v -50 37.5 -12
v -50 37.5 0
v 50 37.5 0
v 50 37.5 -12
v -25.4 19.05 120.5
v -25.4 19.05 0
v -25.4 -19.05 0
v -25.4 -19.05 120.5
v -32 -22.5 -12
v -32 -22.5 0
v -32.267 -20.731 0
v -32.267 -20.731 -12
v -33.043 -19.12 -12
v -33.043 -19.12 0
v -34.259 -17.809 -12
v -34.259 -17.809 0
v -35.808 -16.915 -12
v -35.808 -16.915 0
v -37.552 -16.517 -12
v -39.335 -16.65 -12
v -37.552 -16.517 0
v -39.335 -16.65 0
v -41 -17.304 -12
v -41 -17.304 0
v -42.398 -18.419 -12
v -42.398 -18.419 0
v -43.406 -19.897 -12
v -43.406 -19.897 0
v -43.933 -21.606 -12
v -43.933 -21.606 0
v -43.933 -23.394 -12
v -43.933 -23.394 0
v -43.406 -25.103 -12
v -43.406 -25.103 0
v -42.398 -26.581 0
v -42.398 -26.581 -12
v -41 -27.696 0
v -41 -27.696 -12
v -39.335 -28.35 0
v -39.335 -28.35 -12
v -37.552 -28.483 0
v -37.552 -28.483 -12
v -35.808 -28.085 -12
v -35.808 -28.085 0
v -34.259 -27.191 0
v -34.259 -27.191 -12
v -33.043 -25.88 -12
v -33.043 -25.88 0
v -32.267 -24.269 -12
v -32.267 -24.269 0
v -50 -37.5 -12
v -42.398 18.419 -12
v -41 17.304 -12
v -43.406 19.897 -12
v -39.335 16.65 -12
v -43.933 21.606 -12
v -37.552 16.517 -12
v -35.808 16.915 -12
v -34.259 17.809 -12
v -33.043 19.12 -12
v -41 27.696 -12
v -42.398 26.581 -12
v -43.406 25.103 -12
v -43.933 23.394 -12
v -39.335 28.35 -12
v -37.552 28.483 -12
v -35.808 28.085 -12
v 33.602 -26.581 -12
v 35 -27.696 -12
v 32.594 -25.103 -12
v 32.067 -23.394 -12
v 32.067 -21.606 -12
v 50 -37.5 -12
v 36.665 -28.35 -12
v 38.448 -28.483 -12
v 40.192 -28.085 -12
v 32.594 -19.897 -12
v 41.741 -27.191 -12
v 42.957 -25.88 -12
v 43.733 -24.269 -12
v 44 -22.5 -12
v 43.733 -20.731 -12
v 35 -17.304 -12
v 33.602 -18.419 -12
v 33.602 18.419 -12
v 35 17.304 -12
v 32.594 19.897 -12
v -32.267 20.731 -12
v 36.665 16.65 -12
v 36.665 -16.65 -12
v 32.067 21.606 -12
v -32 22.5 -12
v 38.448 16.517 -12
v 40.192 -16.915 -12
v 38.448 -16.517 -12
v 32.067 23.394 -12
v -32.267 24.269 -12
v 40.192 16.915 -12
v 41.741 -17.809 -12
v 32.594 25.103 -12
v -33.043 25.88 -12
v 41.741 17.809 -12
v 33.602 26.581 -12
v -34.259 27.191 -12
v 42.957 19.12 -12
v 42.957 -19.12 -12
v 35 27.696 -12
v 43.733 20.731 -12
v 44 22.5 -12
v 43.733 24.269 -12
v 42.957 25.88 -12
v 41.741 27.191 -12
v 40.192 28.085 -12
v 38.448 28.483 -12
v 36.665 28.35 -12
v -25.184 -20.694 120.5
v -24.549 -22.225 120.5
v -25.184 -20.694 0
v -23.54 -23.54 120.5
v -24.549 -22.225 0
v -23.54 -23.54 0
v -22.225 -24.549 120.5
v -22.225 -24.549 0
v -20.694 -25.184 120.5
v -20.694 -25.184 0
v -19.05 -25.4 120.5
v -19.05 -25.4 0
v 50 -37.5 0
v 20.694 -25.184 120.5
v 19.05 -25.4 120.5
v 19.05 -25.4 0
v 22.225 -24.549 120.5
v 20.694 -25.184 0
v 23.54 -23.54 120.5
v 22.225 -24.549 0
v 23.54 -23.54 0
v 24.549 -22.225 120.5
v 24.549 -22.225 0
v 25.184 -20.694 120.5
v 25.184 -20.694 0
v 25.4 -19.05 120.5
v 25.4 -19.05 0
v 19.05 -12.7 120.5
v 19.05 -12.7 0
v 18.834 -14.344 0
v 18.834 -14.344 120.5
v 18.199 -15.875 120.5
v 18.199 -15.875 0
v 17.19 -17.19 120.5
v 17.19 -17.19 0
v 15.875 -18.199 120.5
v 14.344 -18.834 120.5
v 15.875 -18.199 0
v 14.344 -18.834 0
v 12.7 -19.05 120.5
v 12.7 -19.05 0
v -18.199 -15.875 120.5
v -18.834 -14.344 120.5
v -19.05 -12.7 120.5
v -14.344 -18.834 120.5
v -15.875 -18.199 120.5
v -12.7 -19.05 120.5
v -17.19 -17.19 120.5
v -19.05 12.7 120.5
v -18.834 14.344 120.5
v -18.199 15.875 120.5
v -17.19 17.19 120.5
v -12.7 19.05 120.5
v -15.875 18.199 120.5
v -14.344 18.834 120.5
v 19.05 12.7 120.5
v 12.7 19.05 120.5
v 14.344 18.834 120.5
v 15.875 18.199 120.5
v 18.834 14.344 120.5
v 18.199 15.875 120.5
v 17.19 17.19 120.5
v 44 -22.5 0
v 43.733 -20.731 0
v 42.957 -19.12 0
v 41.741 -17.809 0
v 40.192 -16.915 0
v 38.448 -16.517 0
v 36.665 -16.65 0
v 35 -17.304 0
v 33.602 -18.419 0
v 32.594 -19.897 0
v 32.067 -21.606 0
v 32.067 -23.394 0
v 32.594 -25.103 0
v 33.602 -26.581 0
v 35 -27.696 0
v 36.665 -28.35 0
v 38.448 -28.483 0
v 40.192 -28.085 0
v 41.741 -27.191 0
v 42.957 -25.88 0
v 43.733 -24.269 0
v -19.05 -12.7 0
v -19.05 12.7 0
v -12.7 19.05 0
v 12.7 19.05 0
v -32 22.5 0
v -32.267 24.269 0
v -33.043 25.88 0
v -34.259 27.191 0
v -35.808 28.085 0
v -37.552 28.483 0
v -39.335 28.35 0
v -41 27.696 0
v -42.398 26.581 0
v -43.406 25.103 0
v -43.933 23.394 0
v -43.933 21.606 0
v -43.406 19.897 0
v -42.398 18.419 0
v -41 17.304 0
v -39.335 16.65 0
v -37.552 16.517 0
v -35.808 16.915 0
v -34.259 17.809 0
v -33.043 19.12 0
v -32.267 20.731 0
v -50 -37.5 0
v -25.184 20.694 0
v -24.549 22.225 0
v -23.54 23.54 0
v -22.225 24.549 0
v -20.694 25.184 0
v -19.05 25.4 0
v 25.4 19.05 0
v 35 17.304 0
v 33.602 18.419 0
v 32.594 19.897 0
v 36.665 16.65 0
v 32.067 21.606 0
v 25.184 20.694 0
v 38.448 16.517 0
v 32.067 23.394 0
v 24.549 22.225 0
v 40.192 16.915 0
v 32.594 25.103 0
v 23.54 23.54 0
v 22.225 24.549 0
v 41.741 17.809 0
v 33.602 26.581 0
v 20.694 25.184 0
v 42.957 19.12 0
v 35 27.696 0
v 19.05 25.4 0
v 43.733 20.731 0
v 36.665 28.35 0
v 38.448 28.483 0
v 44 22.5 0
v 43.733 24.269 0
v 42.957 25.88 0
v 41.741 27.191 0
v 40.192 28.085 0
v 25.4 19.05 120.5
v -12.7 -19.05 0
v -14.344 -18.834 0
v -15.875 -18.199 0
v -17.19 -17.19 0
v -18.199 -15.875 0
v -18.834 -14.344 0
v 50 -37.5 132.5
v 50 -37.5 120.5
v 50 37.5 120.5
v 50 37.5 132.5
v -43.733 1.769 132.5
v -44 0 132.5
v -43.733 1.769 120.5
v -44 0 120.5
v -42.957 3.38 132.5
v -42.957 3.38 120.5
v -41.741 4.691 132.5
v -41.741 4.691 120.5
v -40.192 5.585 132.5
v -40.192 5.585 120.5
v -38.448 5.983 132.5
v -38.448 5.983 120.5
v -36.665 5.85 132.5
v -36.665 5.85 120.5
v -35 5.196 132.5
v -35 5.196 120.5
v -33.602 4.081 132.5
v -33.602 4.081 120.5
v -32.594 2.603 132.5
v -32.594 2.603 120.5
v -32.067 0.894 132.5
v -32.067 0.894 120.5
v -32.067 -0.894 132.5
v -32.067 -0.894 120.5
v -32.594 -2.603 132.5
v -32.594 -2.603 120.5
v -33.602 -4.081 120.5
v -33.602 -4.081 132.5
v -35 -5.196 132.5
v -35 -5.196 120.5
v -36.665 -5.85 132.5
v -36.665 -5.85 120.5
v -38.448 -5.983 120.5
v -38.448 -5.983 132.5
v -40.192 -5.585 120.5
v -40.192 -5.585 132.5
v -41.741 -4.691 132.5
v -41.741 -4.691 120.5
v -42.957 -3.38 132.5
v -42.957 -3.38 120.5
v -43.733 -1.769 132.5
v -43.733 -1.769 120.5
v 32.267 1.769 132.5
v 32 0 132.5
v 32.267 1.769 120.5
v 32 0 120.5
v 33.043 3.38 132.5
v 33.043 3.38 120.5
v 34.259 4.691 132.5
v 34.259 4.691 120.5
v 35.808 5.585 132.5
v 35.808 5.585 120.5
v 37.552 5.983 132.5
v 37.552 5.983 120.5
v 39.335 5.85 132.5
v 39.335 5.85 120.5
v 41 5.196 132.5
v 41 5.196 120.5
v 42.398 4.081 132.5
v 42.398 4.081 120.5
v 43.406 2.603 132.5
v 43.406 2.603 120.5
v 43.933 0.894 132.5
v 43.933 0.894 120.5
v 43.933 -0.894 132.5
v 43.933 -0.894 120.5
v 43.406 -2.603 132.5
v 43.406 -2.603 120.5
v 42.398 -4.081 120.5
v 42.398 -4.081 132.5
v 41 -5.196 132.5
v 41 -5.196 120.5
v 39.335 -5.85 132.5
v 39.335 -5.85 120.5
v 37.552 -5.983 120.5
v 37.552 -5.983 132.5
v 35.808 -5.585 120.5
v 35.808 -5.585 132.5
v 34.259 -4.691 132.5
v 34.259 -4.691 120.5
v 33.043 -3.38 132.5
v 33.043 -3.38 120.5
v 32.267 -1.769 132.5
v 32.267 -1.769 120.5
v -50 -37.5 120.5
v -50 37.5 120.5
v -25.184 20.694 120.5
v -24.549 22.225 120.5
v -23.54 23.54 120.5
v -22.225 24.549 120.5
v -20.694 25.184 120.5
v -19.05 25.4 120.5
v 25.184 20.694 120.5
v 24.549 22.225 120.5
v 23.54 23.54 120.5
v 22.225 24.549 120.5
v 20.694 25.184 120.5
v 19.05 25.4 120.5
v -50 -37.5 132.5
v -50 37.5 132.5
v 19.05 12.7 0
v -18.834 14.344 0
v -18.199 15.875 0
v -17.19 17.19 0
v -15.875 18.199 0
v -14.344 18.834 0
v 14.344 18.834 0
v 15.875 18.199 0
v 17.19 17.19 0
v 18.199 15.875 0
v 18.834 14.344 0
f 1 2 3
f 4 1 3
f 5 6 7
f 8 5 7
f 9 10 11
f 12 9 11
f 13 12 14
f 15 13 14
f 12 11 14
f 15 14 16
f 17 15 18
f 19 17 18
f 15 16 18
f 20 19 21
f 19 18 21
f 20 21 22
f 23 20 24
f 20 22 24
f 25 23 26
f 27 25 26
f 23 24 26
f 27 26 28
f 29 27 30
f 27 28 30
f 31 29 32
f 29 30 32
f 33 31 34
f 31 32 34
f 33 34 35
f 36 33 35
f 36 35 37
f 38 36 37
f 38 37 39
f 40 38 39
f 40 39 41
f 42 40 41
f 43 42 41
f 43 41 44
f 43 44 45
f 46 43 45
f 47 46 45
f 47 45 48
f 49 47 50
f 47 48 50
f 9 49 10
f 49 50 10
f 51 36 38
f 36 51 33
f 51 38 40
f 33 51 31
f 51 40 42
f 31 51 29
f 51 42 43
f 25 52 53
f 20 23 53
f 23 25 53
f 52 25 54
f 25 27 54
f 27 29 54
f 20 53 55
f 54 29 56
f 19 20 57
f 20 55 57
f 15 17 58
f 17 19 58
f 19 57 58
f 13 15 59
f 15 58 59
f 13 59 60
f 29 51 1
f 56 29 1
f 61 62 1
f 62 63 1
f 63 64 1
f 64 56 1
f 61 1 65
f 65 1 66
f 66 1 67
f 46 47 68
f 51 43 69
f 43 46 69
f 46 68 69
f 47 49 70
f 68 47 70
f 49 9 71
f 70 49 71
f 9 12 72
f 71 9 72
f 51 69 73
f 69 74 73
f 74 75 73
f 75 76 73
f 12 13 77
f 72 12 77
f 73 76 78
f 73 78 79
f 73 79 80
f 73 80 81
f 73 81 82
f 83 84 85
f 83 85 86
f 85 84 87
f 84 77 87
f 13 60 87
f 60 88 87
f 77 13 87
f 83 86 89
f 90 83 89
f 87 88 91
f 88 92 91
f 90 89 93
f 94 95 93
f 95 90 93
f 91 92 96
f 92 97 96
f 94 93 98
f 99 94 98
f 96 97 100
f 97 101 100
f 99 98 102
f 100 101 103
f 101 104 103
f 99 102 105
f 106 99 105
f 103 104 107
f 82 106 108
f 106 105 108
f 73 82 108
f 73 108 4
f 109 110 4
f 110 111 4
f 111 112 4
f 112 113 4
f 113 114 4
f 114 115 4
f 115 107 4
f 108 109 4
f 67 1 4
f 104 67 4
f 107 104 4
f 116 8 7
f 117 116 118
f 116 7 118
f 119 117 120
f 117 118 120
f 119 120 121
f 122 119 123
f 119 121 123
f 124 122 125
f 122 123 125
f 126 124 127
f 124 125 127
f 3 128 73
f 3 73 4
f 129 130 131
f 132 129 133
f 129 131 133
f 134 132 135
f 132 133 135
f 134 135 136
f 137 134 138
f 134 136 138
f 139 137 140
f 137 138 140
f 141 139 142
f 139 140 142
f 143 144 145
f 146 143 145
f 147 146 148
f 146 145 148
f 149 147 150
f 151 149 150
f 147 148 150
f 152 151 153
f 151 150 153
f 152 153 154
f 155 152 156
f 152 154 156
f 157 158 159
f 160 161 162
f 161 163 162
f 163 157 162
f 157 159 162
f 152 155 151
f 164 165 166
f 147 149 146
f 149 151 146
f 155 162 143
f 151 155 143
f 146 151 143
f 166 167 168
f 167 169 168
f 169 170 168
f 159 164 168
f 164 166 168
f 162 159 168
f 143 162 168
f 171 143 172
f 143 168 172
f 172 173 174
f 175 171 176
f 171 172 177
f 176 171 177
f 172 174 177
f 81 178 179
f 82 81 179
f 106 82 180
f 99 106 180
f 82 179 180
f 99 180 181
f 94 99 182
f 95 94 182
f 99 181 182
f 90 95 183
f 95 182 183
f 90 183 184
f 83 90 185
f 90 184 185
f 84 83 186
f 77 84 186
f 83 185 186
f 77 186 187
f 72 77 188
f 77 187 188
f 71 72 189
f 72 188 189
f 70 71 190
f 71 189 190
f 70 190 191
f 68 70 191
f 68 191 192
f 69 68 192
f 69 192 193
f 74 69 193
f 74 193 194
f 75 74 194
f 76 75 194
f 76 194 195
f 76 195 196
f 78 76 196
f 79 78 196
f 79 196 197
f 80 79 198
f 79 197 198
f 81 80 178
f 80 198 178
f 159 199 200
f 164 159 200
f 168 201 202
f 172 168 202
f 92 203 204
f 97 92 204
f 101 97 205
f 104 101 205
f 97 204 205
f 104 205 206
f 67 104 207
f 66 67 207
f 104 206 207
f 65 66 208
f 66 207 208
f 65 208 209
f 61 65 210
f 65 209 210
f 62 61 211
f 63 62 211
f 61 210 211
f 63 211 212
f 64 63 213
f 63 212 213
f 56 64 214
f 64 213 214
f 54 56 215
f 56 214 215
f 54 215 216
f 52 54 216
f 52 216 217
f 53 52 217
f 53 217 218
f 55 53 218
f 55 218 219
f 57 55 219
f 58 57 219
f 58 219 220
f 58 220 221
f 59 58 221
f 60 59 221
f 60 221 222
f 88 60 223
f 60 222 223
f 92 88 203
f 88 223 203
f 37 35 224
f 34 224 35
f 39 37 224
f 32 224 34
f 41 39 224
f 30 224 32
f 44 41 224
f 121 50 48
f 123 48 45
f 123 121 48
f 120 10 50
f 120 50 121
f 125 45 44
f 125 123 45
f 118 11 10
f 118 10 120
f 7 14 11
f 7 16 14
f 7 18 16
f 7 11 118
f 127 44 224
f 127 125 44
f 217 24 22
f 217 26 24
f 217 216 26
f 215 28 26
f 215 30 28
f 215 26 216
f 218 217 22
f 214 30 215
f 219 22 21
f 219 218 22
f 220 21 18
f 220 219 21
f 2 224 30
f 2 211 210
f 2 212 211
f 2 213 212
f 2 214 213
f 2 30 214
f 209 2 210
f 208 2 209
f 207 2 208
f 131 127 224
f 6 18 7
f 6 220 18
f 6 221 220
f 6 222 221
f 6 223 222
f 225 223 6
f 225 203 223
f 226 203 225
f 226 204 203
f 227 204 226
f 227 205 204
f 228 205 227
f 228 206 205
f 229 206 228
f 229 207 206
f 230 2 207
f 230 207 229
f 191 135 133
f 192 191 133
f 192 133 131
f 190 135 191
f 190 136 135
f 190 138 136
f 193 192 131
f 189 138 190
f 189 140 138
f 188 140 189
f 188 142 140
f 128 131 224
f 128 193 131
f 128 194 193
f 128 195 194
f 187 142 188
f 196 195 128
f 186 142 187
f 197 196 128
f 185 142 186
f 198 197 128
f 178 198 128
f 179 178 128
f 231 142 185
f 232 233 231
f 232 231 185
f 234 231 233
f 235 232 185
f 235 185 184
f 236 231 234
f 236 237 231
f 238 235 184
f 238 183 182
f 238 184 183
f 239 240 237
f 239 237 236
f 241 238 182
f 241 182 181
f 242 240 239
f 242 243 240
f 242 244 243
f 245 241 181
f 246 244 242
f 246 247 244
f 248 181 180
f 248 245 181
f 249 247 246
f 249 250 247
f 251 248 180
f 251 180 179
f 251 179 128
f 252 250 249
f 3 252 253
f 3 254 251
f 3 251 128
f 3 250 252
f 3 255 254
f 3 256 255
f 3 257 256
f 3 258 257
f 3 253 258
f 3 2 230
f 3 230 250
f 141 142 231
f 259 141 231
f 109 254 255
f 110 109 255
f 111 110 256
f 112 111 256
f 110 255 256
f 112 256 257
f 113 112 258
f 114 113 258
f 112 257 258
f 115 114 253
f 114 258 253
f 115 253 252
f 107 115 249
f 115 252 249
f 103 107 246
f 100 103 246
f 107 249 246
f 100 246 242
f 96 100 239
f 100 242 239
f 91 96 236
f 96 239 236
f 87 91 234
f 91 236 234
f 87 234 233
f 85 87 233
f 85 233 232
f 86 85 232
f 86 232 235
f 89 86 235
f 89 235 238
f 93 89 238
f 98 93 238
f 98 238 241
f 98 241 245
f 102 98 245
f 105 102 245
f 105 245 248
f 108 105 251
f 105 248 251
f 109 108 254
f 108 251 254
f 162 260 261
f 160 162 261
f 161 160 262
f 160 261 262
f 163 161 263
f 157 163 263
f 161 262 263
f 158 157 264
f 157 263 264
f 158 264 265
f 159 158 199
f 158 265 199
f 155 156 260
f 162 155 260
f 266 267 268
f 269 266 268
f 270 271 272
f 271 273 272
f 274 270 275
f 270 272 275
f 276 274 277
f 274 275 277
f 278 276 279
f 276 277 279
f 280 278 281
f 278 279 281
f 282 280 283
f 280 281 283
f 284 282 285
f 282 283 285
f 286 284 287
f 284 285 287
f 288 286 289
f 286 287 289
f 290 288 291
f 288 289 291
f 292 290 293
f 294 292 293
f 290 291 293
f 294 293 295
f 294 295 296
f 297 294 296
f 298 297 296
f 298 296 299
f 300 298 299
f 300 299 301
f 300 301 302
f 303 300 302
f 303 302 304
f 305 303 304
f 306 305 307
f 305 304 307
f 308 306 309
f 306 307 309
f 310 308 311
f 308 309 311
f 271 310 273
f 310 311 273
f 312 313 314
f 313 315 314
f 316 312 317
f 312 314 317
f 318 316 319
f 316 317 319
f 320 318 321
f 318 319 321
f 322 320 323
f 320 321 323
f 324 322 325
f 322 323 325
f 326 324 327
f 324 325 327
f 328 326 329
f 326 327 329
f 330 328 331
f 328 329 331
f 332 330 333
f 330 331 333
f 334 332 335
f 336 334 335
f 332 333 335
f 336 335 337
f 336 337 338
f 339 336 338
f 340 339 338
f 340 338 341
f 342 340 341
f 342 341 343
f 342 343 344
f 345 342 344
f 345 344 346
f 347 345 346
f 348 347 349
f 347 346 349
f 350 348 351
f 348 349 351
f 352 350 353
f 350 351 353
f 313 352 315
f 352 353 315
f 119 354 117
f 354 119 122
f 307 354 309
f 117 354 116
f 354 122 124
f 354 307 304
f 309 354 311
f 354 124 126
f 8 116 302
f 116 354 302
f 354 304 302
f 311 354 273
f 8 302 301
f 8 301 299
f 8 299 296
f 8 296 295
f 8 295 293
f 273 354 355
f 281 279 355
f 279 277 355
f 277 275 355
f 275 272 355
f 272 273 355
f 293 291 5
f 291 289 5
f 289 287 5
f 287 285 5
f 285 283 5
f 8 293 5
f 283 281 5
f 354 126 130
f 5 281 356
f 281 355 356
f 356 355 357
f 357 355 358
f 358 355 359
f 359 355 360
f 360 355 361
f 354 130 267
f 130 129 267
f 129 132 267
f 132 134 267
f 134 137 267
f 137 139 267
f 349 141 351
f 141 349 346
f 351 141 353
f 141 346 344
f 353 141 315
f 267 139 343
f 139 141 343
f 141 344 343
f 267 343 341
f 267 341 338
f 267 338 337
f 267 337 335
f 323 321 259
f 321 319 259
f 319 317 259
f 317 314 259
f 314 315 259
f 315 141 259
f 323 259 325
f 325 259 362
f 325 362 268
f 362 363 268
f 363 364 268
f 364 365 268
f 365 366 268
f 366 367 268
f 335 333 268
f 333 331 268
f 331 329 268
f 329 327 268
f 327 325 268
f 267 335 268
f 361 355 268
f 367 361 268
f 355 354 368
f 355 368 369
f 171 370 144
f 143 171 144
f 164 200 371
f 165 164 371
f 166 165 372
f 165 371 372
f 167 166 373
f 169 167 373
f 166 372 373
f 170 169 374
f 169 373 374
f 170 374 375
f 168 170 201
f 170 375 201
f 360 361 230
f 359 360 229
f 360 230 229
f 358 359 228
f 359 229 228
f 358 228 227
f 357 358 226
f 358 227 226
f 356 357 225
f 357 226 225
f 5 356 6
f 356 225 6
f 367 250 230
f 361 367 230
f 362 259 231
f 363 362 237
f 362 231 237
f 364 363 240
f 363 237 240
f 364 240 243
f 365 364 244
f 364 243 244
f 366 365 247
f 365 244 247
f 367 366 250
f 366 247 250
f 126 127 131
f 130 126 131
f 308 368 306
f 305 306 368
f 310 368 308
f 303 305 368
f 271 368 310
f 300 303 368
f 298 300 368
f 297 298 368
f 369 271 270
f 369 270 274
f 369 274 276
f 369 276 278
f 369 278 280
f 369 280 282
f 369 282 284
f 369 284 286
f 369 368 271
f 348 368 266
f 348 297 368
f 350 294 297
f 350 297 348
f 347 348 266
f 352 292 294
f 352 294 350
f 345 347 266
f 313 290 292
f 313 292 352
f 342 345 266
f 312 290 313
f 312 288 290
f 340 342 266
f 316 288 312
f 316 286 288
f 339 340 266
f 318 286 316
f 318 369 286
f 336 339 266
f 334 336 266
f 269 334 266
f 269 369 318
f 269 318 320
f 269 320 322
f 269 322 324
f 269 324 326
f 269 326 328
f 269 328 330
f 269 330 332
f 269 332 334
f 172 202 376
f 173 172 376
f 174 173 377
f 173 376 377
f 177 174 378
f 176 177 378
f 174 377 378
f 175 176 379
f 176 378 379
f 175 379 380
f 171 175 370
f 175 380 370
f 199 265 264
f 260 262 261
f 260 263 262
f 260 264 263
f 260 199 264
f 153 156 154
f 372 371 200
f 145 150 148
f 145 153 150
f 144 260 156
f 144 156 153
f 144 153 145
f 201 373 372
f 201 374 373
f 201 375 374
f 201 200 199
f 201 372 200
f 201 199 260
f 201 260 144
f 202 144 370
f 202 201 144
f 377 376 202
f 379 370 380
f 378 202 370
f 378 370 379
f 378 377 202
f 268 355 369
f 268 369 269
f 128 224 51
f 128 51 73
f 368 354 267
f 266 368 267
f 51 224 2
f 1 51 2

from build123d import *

# Parameters (mm, degrees)
F0_W     = 100
F0_H     = 75
F1_DEPTH = 12
F3_DEPTH = 120.5
F5_W     = 100
F5_H     = 75
F6_DEPTH = 12
F8_D     = 12
F8_DEPTH = 12
F8_TIP   = 3.6051637142
F9_D     = 12
F9_DEPTH = 12
F9_TIP   = 3.6051637142


with BuildPart() as f1:
    # F0 (on Top) → F1 (new body)
    with BuildSketch(Plane.XY):
        Rectangle(F0_W, F0_H)
    extrude(amount=-F1_DEPTH)

    # F2 (on face) → F3 (join)
    with BuildSketch(Plane.XY):
        with BuildLine():
            Line((-19.05, -25.4), (19.05, -25.4))
            ThreePointArc((19.05, -25.4), (23.5401280605, -23.5401280605), (25.4, -19.05))
            Line((25.4, -19.05), (25.4, 19.05))
            ThreePointArc((25.4, 19.05), (23.5401280605, 23.5401280605), (19.05, 25.4))
            Line((19.05, 25.4), (-19.05, 25.4))
            ThreePointArc((-19.05, 25.4), (-23.5401280605, 23.5401280605), (-25.4, 19.05))
            Line((-25.4, 19.05), (-25.4, -19.05))
            ThreePointArc((-25.4, -19.05), (-23.5401280605, -23.5401280605), (-19.05, -25.4))
        make_face()
        with BuildLine():
            Line((-12.7, 19.05), (12.7, 19.05))
            ThreePointArc((12.7, 19.05), (17.1901280605, 17.1901280605), (19.05, 12.7))
            Line((19.05, 12.7), (19.05, -12.7))
            ThreePointArc((19.05, -12.7), (17.1901280605, -17.1901280605), (12.7, -19.05))
            Line((12.7, -19.05), (-12.7, -19.05))
            ThreePointArc((-12.7, -19.05), (-17.1901280605, -17.1901280605), (-19.05, -12.7))
            Line((-19.05, -12.7), (-19.05, 12.7))
            ThreePointArc((-19.05, 12.7), (-17.1901280605, 17.1901280605), (-12.7, 19.05))
        make_face(mode=Mode.SUBTRACT)
    extrude(amount=F3_DEPTH)

    # F5 (on face) → F6 (join)
    with BuildSketch(Plane.XY.offset(120.5)):
        Rectangle(F5_W, F5_H)
        with BuildLine():
            Line((19.05, -25.4), (-19.05, -25.4))
            ThreePointArc((-19.05, -25.4), (-23.5401280605, -23.5401280605), (-25.4, -19.05))
            Line((-25.4, -19.05), (-25.4, 19.05))
            ThreePointArc((-25.4, 19.05), (-23.5401280605, 23.5401280605), (-19.05, 25.4))
            Line((-19.05, 25.4), (19.05, 25.4))
            ThreePointArc((19.05, 25.4), (23.5401280605, 23.5401280605), (25.4, 19.05))
            Line((25.4, 19.05), (25.4, -19.05))
            ThreePointArc((25.4, -19.05), (23.5401280605, -23.5401280605), (19.05, -25.4))
        make_face(mode=Mode.SUBTRACT)
        with BuildLine():
            ThreePointArc((-25.4, -19.05), (-23.5401280605, -23.5401280605), (-19.05, -25.4))
            Line((-19.05, -25.4), (19.05, -25.4))
            ThreePointArc((19.05, -25.4), (23.5401280605, -23.5401280605), (25.4, -19.05))
            Line((25.4, -19.05), (25.4, 19.05))
            ThreePointArc((25.4, 19.05), (23.5401280605, 23.5401280605), (19.05, 25.4))
            Line((19.05, 25.4), (-19.05, 25.4))
            ThreePointArc((-19.05, 25.4), (-23.5401280605, 23.5401280605), (-25.4, 19.05))
            Line((-25.4, 19.05), (-25.4, -19.05))
        make_face()
        with BuildLine():
            Line((-19.05, -12.7), (-19.05, 12.7))
            ThreePointArc((-19.05, 12.7), (-17.1901280605, 17.1901280605), (-12.7, 19.05))
            Line((-12.7, 19.05), (12.7, 19.05))
            ThreePointArc((12.7, 19.05), (17.1901280605, 17.1901280605), (19.05, 12.7))
            Line((19.05, 12.7), (19.05, -12.7))
            ThreePointArc((19.05, -12.7), (17.1901280605, -17.1901280605), (12.7, -19.05))
            Line((12.7, -19.05), (-12.7, -19.05))
            ThreePointArc((-12.7, -19.05), (-17.1901280605, -17.1901280605), (-19.05, -12.7))
        make_face(mode=Mode.SUBTRACT)
        with BuildLine():
            ThreePointArc((-12.7, 19.05), (-17.1901280605, 17.1901280605), (-19.05, 12.7))
            Line((-19.05, 12.7), (-19.05, -12.7))
            ThreePointArc((-19.05, -12.7), (-17.1901280605, -17.1901280605), (-12.7, -19.05))
            Line((-12.7, -19.05), (12.7, -19.05))
            ThreePointArc((12.7, -19.05), (17.1901280605, -17.1901280605), (19.05, -12.7))
            Line((19.05, -12.7), (19.05, 12.7))
            ThreePointArc((19.05, 12.7), (17.1901280605, 17.1901280605), (12.7, 19.05))
            Line((12.7, 19.05), (-12.7, 19.05))
        make_face()
    extrude(amount=F6_DEPTH)

    # F8
    with Locations(Plane.XY.offset(132.5)):
        with Locations((-38, 0), (38, 0)):
            Hole(F8_D / 2, depth=F8_DEPTH)
            with Locations((0, 0, -(F8_DEPTH + F8_TIP / 2))):  # 118° drill point
                Cone(0, F8_D / 2, F8_TIP, mode=Mode.SUBTRACT)

    # F9 (one way)
    with BuildSketch(Plane.XY):
        with Locations((-38, 22.5), (38, 22.5), (38, -22.5), (-38, -22.5)):
            Circle(F9_D / 2)
    extrude(amount=-F9_DEPTH, mode=Mode.SUBTRACT)
    with Locations(Plane.XY):
        with Locations((-38, 22.5), (38, 22.5), (38, -22.5), (-38, -22.5)):
            with Locations((0, 0, -(F9_DEPTH + F9_TIP / 2))):  # 118° drill point
                Cone(0, F9_D / 2, F9_TIP, mode=Mode.SUBTRACT)


solid = f1.part
